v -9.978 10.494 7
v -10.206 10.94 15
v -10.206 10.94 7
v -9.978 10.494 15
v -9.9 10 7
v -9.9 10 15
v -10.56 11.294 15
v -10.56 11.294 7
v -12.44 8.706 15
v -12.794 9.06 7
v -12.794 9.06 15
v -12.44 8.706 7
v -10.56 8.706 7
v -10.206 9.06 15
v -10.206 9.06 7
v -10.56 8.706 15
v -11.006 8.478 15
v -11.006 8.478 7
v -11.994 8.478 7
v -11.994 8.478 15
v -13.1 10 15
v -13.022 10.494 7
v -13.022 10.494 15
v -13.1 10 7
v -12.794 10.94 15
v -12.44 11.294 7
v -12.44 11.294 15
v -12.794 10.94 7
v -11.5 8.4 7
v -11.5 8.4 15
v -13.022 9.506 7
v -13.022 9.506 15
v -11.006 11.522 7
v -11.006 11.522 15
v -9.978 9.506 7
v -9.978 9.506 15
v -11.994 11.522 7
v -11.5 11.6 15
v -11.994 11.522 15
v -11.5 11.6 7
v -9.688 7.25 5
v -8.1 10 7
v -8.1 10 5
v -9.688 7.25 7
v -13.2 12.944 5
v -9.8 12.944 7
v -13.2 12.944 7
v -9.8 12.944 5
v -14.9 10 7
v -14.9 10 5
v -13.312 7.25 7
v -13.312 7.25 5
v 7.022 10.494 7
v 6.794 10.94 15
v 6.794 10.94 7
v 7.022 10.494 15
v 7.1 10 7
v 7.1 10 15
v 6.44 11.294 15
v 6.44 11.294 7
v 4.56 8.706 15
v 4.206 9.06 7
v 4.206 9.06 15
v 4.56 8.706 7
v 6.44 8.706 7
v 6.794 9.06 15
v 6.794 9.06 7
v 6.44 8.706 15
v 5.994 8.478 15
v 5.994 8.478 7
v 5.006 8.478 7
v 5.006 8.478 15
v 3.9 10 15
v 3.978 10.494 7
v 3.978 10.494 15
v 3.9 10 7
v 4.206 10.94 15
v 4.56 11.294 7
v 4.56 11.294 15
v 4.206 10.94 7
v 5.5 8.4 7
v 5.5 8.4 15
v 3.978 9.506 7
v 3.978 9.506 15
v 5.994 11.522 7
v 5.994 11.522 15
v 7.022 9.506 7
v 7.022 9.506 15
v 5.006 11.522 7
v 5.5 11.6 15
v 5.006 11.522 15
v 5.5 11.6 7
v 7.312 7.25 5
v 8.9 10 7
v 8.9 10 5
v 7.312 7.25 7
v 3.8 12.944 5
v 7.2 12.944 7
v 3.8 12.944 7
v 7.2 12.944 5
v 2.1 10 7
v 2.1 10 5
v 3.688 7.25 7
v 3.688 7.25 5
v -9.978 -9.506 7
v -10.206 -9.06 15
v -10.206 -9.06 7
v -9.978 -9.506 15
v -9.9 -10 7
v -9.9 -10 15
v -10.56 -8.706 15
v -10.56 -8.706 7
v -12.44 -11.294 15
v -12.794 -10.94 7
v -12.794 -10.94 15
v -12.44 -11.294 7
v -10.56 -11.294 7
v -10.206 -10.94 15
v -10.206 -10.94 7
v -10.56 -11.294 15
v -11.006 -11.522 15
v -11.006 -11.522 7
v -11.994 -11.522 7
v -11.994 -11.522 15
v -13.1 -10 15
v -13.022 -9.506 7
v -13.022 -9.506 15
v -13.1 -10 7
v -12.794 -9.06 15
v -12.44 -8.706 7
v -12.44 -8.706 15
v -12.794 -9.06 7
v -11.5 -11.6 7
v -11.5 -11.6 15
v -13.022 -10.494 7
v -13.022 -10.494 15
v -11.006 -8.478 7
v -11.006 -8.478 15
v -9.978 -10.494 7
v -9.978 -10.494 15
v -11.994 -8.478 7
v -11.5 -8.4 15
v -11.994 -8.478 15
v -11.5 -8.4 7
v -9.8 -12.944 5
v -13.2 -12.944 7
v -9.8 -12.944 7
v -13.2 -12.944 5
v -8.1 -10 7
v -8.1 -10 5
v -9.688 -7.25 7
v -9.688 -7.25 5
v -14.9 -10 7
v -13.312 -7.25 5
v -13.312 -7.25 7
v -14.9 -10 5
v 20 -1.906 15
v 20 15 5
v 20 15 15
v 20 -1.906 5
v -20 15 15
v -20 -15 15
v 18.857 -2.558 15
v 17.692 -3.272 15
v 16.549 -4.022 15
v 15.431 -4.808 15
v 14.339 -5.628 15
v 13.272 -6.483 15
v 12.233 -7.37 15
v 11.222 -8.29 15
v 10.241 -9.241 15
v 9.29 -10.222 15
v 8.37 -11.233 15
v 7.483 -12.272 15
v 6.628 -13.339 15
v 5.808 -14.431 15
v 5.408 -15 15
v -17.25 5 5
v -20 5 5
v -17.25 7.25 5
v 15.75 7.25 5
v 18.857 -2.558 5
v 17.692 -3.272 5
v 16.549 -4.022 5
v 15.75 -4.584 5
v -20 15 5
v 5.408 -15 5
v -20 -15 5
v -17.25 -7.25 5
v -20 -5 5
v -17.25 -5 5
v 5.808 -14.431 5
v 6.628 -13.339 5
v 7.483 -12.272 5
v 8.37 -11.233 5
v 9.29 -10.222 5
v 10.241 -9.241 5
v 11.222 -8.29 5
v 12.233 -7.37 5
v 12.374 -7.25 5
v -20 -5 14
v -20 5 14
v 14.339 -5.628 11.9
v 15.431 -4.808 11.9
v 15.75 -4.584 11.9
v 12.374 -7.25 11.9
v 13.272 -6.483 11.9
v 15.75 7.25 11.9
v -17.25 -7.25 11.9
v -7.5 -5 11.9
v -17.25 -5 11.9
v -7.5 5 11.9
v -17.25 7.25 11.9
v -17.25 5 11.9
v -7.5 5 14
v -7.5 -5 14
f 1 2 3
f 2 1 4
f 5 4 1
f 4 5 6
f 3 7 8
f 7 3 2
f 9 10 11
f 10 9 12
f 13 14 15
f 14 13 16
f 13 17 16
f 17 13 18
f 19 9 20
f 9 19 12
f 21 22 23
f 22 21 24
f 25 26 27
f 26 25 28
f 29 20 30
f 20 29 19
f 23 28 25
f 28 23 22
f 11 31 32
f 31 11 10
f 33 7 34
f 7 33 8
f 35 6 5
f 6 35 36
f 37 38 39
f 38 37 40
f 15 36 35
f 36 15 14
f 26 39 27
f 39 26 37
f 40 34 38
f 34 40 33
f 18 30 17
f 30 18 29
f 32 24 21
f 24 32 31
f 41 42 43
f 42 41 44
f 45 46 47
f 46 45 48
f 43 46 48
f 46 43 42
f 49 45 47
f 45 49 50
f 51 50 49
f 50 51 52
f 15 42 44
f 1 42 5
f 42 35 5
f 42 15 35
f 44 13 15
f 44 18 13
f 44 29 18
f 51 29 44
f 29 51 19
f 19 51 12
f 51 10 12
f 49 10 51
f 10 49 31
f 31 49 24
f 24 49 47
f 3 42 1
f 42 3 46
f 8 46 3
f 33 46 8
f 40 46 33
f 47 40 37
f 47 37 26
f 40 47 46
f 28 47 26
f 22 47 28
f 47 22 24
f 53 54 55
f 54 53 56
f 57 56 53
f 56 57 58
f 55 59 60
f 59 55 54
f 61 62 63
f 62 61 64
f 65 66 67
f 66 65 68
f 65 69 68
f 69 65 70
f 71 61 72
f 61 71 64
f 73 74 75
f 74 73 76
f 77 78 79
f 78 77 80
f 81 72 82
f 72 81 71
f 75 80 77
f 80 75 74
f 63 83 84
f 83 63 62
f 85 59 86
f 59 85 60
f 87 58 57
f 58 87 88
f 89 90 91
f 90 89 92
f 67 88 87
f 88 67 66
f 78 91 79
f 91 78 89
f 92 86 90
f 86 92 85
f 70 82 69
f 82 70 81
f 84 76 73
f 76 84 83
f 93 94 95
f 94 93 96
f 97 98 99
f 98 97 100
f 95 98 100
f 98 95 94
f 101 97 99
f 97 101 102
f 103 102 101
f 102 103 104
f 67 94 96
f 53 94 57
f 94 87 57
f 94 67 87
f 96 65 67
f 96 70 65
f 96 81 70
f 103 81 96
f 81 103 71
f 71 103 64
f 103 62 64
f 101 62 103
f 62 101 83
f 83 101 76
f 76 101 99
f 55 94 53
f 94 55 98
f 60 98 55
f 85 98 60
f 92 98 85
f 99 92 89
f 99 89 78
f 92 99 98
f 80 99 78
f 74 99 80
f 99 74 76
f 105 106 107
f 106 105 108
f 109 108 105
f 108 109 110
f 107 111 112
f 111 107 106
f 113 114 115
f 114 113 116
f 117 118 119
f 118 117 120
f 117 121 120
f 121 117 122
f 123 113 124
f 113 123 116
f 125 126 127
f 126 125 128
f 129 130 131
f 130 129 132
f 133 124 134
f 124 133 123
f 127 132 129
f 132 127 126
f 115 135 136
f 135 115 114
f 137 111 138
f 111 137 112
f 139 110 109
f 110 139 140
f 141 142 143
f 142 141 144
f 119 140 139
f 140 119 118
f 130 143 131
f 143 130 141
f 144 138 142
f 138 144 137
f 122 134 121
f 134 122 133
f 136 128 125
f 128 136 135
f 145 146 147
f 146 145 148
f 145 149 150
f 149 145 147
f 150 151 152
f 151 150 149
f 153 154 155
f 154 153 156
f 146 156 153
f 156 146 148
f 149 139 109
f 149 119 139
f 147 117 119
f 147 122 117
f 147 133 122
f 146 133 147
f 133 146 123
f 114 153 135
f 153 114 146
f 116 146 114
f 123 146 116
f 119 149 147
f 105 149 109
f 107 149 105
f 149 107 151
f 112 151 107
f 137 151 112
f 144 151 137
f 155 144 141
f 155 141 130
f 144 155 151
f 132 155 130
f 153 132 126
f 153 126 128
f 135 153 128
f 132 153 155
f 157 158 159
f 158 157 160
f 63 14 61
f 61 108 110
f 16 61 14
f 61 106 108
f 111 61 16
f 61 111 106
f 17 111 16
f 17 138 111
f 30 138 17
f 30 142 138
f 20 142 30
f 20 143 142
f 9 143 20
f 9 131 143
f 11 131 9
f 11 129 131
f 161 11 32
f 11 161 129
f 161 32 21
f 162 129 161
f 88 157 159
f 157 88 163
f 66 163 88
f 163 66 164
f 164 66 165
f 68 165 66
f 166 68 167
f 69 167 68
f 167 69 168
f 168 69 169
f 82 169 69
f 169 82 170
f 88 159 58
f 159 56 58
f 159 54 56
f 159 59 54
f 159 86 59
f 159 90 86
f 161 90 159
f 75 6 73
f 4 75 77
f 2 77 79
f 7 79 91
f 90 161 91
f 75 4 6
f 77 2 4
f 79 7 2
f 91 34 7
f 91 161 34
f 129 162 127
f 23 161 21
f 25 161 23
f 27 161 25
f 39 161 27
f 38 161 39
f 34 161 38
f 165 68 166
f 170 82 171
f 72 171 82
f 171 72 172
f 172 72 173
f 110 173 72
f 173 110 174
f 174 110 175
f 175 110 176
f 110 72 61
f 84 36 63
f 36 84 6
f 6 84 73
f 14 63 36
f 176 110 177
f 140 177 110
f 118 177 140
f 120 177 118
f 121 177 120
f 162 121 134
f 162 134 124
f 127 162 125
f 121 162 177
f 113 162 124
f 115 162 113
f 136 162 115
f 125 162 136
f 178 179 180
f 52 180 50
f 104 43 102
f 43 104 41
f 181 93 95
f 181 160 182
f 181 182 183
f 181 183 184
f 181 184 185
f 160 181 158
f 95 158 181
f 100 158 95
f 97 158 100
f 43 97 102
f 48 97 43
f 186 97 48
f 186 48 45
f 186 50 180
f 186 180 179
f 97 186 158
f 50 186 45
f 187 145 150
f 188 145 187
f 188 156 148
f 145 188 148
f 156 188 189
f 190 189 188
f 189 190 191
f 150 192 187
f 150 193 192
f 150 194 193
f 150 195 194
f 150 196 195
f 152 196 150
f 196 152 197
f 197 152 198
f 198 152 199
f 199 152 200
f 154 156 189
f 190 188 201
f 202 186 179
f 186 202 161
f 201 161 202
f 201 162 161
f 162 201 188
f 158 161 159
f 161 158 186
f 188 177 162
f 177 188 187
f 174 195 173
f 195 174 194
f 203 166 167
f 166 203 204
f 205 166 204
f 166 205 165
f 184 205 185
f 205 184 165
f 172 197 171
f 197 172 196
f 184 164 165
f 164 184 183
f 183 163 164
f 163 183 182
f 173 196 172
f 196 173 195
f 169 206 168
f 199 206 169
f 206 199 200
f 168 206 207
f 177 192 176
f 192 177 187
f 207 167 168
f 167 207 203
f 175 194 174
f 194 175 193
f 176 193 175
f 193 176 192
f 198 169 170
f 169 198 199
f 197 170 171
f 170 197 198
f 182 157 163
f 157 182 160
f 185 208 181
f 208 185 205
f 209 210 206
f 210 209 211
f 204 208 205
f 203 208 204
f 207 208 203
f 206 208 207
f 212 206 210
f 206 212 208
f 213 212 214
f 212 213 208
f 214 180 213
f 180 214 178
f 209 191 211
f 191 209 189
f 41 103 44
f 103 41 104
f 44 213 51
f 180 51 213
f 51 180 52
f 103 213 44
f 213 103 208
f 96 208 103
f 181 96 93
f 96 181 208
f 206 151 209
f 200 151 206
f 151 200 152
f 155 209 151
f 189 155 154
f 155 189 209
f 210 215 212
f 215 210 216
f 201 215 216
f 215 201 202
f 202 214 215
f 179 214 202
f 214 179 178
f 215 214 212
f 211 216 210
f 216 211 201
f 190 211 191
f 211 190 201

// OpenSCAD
width = 40;
height = 30;
baseDepth = 5;
lidDepth = 10;
ridgeTopWidth = 7;
ridgeBottomWidth = 10;
ridgeSpacing = 15;
ridgeHeight = 1.4;
mainHoleSpacing = 20;
thirdHoleSpacing = 17;
mainHoleDistanceFromEdge = 6;

sensorHoleCenter = 12.5; 
sensorWidth = 6.5;
sensorHeight = 11;

pulleyRadius = 48;
pulleyX = 41;
pulleyY = 40;

$fn = 20;

delta = 0;

module mountingHole(lid)
{
    cylinder(r = 1.6, h = 100, center = true);
    
    if (lid)
    {
        delta = 2.001;
    }
    else
    {
        delta = 1.999;
    }
    
    translate([0, 0, baseDepth + delta])
        cylinder(r = 3.4, h = 4, $fn = 6, center = true);
}

module holes(lid)
{
    translate([-17.5, 0, 0])
    {
        translate([mainHoleDistanceFromEdge, mainHoleSpacing / 2, 0])
        {
            mountingHole(lid);
        }

        translate([mainHoleDistanceFromEdge + thirdHoleSpacing, mainHoleSpacing / 2, 0])
        {
            mountingHole(lid);
        }

        translate([mainHoleDistanceFromEdge, -mainHoleSpacing / 2, 0])
        {
            mountingHole(lid);
        }
    }
}

module ridge()
{
    translate([-25, 0, -0.001])
    {
        rotate([0, 0, 90])
        rotate([90, 0 ,0])
        {
            linear_extrude(width + 10)
            {
                ridgeProfile =
                [
                    [-ridgeBottomWidth / 2, 0], 
                    [ridgeBottomWidth / 2, 0], 
                    [ridgeTopWidth / 2, ridgeHeight], 
                    [-ridgeTopWidth / 2, ridgeHeight]
                ];
                
                polygon(points=ridgeProfile);
            }
            //cube([width * 3, ridgeWidth, ridgeDepth], center=true);
        }
    }
}

module pinTrench()
{
    translate ([-14.5, 0, baseDepth])
    {
        cube([4, 10, 4], center = true);
    }
}

module ridges()
{
    translate([0, ridgeSpacing / 2, 0])
    {
        ridge();
    }

    translate([0, -ridgeSpacing / 2, 0])
    {
        ridge();
    }
}

module pulley()
{
    translate([pulleyX, -pulleyY, (-baseDepth/2) +2])
    {
        cylinder(r1 = pulleyRadius , r2 = pulleyRadius - 5, h = baseDepth+1, $fn=200);
        cylinder(r = pulleyRadius -4.5, h = baseDepth + lidDepth + 20, $fn=200);
    }
}

module base()
{
    difference()
    {
        union()
        {
            //pinTrench();            
            //pulley();
            
            difference()
            {
                translate([0, 0, baseDepth / 2])
                {
                    cube([width, height, baseDepth], center = true);
                }
                holes(false);
            }
        }
        
        pinTrench();      // 
        ridges();//
        
        translate([sensorHoleCenter, 0, 10])//
        {
            cube([sensorWidth, sensorHeight, 40], center = true);
        }
        
        pulley();//
    }
}

module lid()
{
    difference()
    {
        union()
        {   
            difference()
            {
                translate([0, 0, (lidDepth / 2) + baseDepth])
                {
                    cube([width, height, lidDepth], center = true);
                }
                holes(true);
            }
        }

        rightEdge = sensorHoleCenter + sensorWidth / 2;
        boardWidth = 33;
        position = rightEdge - (boardWidth / 2);
        translate([position, 0, 8.4])
        {
            cube([boardWidth, 14.5, 7], center = true);
        }

        translate([-width / 2, 0, baseDepth + 2])
        {
            cube([25, 10, 14], center = true);
        }

        pulley();
    }
}

//ridges();
//base();
lid();
